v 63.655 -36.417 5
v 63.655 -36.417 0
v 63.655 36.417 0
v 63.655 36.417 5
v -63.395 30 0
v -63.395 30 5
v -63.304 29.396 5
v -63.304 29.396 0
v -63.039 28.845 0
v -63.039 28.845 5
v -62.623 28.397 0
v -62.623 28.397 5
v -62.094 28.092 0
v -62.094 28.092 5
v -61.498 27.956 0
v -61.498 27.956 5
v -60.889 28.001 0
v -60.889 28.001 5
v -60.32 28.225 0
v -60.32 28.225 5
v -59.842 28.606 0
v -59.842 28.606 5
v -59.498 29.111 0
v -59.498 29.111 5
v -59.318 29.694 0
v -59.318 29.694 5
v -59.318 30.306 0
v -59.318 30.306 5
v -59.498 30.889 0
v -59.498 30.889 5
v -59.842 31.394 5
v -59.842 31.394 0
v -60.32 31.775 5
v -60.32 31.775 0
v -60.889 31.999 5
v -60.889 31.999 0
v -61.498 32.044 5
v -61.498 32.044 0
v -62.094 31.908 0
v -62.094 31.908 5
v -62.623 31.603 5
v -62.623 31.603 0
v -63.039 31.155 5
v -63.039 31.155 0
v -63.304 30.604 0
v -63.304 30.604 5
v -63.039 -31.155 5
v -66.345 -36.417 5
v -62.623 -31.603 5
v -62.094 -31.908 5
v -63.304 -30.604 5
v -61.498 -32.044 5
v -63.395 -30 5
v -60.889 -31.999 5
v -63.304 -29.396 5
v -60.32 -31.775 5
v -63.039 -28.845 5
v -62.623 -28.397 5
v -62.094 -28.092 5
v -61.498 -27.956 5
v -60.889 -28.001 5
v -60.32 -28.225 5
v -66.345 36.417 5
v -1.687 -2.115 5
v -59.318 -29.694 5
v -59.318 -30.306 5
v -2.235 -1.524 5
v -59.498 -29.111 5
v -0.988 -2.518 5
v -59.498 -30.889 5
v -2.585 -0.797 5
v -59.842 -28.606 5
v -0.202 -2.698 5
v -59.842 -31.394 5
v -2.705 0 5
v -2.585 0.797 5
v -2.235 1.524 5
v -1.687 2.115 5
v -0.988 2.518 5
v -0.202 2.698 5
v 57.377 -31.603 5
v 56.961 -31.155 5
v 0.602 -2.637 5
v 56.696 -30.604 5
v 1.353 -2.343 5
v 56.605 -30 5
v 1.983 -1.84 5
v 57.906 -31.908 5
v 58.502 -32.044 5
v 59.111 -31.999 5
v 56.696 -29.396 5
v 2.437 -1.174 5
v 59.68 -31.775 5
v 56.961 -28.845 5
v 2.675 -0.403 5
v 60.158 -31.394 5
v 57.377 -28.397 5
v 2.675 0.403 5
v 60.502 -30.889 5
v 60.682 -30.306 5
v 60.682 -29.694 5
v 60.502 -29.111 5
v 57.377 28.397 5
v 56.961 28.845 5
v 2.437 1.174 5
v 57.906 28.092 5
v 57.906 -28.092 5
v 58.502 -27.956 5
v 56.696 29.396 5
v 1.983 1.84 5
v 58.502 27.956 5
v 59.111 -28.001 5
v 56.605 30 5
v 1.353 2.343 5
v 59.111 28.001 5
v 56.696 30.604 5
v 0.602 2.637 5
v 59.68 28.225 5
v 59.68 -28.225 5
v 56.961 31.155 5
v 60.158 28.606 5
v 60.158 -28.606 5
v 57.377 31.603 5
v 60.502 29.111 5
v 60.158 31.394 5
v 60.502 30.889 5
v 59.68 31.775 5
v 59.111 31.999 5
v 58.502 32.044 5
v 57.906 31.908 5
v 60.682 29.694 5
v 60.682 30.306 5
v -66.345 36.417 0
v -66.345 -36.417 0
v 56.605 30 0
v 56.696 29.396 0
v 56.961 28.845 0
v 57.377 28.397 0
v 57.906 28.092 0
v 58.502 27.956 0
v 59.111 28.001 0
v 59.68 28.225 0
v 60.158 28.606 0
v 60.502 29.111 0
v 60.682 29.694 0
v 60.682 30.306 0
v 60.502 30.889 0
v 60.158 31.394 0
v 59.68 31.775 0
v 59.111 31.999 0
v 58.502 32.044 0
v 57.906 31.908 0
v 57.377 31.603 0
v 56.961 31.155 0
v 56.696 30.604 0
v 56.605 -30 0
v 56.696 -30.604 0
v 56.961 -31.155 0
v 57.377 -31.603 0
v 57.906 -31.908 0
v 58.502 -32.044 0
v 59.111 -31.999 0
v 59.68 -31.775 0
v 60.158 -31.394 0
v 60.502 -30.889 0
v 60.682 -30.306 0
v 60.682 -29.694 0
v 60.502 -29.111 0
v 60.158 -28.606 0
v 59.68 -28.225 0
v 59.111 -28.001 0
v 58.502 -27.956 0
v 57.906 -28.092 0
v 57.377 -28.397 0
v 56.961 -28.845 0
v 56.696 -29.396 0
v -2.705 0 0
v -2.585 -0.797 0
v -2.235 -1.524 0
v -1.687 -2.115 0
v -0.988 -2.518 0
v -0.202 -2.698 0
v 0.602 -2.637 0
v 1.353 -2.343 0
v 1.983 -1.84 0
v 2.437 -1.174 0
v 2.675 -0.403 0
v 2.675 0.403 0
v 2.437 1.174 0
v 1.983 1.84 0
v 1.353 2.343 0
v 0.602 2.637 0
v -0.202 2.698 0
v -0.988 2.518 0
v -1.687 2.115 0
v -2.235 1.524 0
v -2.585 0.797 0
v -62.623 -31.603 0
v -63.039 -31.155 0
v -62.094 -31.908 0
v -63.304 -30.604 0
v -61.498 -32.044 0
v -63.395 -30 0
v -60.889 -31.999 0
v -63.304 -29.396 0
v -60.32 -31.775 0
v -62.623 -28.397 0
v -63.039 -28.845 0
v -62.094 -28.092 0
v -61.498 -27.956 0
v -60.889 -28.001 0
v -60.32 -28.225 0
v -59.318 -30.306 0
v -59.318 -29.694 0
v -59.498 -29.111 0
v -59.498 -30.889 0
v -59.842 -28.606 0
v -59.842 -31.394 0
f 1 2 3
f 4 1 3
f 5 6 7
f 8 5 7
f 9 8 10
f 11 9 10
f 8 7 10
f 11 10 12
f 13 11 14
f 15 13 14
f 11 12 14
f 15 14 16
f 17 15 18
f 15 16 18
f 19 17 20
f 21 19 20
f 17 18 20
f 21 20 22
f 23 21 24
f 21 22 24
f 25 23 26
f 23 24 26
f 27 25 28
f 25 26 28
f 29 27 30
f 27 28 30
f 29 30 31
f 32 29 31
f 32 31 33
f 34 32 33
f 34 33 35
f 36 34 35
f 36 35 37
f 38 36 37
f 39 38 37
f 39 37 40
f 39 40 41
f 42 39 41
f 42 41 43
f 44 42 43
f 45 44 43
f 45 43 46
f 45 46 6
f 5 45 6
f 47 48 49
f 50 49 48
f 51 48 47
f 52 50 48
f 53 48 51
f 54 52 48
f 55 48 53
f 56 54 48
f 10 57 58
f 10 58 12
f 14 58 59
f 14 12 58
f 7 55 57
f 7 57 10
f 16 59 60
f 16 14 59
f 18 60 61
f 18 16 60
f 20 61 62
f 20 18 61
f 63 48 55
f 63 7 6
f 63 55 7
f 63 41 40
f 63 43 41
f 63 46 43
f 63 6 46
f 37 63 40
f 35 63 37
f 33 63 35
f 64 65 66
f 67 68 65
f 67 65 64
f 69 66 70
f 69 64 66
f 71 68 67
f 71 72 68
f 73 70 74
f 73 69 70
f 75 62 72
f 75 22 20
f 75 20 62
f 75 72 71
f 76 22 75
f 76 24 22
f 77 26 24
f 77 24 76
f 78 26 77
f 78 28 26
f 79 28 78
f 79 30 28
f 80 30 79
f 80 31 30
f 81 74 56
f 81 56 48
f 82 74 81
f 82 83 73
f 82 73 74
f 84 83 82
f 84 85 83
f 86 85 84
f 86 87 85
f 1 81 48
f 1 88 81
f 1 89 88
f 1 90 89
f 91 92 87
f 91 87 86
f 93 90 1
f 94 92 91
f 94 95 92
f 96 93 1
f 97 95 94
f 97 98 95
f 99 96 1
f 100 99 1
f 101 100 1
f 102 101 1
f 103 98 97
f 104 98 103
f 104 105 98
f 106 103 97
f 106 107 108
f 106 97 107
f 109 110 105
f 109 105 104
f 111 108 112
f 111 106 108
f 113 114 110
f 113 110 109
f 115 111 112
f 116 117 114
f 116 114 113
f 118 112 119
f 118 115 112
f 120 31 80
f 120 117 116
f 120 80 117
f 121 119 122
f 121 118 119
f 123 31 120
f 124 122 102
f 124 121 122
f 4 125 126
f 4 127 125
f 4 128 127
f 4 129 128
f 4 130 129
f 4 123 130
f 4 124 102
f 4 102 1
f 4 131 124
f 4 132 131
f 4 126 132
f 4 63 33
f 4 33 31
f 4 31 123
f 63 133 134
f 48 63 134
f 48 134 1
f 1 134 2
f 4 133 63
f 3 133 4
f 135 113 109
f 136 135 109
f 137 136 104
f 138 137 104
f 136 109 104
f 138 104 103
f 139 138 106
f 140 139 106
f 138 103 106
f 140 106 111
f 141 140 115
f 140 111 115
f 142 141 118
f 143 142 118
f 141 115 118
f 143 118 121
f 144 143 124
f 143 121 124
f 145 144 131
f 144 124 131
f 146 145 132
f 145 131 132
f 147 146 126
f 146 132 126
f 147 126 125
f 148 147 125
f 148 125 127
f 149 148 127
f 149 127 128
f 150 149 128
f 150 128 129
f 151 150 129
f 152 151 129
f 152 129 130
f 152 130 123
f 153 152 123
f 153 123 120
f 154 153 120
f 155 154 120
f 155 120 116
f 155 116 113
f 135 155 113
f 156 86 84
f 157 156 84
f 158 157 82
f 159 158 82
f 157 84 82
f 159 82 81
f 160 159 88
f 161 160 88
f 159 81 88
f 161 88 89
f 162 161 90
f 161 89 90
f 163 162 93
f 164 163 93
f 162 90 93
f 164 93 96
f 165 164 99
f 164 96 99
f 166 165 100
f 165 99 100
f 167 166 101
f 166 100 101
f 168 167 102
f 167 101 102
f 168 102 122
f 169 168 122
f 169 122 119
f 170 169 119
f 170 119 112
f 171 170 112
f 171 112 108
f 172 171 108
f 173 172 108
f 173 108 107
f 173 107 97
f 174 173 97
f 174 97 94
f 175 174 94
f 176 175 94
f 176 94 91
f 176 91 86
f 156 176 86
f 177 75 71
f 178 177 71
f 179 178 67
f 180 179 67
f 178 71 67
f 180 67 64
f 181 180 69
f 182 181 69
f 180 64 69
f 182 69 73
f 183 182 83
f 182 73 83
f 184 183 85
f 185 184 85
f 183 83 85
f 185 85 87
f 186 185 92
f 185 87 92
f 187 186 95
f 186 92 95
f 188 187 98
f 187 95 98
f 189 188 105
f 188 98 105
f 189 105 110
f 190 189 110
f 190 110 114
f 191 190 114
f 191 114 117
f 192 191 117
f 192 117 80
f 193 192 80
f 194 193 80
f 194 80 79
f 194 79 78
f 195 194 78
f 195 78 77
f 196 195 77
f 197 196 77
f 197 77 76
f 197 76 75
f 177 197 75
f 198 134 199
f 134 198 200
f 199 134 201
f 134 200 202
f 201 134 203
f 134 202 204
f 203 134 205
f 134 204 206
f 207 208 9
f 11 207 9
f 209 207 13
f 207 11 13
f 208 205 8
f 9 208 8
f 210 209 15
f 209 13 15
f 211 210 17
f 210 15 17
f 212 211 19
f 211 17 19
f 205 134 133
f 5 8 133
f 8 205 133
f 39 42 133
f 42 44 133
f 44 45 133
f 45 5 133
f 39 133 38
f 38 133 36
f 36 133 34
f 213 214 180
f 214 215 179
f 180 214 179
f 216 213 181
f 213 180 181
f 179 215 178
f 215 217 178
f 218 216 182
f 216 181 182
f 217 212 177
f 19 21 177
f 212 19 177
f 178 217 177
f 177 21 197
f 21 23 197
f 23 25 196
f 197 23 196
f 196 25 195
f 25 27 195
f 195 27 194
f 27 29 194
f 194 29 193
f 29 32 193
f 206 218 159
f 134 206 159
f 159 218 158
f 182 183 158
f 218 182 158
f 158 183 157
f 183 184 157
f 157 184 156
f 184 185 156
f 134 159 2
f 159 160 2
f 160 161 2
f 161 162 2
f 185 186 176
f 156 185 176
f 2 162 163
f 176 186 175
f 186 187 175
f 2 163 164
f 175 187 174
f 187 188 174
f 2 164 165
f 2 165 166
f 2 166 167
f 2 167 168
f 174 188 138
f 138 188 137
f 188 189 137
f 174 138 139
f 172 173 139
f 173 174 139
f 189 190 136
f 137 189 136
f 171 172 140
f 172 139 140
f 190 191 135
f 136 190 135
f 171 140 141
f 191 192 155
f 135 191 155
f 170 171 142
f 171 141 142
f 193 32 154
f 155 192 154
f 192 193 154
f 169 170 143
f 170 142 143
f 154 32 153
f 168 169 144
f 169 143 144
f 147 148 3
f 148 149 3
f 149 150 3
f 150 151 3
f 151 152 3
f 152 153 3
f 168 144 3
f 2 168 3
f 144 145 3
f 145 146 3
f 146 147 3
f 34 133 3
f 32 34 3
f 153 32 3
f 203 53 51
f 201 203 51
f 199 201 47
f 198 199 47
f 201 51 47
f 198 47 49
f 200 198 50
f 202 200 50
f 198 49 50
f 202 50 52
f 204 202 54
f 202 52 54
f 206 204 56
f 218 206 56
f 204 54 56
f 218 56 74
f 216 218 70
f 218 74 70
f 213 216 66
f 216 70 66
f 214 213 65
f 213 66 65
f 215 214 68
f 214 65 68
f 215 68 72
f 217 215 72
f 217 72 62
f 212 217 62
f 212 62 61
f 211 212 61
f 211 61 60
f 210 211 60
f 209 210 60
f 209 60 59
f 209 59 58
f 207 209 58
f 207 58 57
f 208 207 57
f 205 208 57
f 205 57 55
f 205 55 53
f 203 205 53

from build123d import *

# Parameters (mm, degrees)
F0_W     = 130
F0_H     = 36.4172644913
F1_DEPTH = 5
F2_D     = 4.1
F3_D     = 5.4102


with BuildPart() as f1:
    # F0 (on Top) → F1 (new body)
    with BuildSketch(Plane.XY):
        with Locations((-1.3452520967, 18.2086322457)):
            Rectangle(F0_W, F0_H)
        with Locations((-1.3452520967, -18.2086322457)):
            Rectangle(F0_W, F0_H)
    extrude(amount=F1_DEPTH)

    # F2 (through all)
    with Locations(Plane(origin=(0, 0, 0), x_dir=(1, 0, 0), z_dir=(0, 0, -1))):
        with Locations((-61.3452520967, -30), (-61.3452520967, 30), (58.6547479033, -30), (58.6547479033, 30)):
            Hole(F2_D / 2)

    # F3 (through all)
    with Locations(Plane(origin=(0, 0, 0), x_dir=(1, 0, 0), z_dir=(0, 0, -1))):
        with Locations((0, 0)):
            Hole(F3_D / 2)


solid = f1.part
